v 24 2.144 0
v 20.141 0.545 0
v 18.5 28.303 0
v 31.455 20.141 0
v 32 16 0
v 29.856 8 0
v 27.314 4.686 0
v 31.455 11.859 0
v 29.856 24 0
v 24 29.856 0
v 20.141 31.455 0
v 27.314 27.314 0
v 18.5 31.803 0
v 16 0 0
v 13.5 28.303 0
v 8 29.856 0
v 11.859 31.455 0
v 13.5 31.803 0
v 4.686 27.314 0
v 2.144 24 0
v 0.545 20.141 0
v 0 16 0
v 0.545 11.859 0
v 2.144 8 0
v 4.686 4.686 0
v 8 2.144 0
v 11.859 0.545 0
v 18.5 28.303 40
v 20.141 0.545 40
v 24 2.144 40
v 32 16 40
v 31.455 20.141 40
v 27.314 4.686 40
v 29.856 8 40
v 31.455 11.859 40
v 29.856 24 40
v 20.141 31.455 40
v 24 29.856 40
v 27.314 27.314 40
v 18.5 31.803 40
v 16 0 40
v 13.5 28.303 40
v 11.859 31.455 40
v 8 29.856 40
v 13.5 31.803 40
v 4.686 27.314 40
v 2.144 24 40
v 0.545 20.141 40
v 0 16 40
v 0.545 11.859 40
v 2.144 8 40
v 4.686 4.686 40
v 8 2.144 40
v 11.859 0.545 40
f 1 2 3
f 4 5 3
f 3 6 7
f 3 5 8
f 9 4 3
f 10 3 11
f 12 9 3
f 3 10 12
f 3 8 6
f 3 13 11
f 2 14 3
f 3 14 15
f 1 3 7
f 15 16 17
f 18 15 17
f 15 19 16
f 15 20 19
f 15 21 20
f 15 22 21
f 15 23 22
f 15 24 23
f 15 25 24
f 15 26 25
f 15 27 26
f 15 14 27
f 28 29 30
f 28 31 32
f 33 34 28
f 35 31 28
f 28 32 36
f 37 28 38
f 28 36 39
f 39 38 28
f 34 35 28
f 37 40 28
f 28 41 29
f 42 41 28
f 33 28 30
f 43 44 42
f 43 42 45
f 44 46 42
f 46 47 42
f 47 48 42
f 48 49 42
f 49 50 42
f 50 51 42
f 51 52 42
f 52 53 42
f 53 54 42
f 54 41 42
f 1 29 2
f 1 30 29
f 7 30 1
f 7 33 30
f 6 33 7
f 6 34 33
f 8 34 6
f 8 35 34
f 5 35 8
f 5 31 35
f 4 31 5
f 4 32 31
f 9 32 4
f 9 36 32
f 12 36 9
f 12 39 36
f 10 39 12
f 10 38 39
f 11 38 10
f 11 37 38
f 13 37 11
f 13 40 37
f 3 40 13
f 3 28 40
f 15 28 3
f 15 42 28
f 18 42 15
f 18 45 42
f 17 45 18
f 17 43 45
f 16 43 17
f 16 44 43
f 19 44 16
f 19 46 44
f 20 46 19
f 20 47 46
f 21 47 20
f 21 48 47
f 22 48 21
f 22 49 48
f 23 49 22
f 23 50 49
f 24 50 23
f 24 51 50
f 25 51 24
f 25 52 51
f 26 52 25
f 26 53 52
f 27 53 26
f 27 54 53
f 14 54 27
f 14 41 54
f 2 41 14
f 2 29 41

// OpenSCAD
$fn = 32;

// ----------------------------------------------------------------------
// Keyway shaft: d32 shaft, key 5 x 3.5 mm
// ----------------------------------------------------------------------

// --- parameters (mm) ---
shaft_r = 16;             // shaft radius
key_w = 5;                // keyway width
key_d = 3.5;              // keyway depth below the surface line
plate_t = 40;             // shaft length, Z (extrusion height)
fit_tol = 0.02;           // declared fit tolerance (prompt contract)
free_tol = 0.2;           // declared free tolerance (prompt contract)

shaft_d = 2 * shaft_r;  // shaft diameter
circle_step = 15;  // polygon sampling step, degrees

profile = [[11.859, 31.455], [8, 29.856], [4.686, 27.314], [2.144, 24], [0.545, 20.141], [0, 16], [0.545, 11.859], [2.144, 8], [4.686, 4.686], [8, 2.144], [11.859, 0.545], [16, 0], [20.141, 0.545], [24, 2.144], [27.314, 4.686], [29.856, 8], [31.455, 11.859], [32, 16], [31.455, 20.141], [29.856, 24], [27.314, 27.314], [24, 29.856], [20.141, 31.455], [18.5, 31.803], [18.5, 28.303], [13.5, 28.303], [13.5, 31.803]];  // primary outline, 27 points, counter clockwise

// --- the one profile operation ---
linear_extrude(height = plate_t) polygon(points = profile);
